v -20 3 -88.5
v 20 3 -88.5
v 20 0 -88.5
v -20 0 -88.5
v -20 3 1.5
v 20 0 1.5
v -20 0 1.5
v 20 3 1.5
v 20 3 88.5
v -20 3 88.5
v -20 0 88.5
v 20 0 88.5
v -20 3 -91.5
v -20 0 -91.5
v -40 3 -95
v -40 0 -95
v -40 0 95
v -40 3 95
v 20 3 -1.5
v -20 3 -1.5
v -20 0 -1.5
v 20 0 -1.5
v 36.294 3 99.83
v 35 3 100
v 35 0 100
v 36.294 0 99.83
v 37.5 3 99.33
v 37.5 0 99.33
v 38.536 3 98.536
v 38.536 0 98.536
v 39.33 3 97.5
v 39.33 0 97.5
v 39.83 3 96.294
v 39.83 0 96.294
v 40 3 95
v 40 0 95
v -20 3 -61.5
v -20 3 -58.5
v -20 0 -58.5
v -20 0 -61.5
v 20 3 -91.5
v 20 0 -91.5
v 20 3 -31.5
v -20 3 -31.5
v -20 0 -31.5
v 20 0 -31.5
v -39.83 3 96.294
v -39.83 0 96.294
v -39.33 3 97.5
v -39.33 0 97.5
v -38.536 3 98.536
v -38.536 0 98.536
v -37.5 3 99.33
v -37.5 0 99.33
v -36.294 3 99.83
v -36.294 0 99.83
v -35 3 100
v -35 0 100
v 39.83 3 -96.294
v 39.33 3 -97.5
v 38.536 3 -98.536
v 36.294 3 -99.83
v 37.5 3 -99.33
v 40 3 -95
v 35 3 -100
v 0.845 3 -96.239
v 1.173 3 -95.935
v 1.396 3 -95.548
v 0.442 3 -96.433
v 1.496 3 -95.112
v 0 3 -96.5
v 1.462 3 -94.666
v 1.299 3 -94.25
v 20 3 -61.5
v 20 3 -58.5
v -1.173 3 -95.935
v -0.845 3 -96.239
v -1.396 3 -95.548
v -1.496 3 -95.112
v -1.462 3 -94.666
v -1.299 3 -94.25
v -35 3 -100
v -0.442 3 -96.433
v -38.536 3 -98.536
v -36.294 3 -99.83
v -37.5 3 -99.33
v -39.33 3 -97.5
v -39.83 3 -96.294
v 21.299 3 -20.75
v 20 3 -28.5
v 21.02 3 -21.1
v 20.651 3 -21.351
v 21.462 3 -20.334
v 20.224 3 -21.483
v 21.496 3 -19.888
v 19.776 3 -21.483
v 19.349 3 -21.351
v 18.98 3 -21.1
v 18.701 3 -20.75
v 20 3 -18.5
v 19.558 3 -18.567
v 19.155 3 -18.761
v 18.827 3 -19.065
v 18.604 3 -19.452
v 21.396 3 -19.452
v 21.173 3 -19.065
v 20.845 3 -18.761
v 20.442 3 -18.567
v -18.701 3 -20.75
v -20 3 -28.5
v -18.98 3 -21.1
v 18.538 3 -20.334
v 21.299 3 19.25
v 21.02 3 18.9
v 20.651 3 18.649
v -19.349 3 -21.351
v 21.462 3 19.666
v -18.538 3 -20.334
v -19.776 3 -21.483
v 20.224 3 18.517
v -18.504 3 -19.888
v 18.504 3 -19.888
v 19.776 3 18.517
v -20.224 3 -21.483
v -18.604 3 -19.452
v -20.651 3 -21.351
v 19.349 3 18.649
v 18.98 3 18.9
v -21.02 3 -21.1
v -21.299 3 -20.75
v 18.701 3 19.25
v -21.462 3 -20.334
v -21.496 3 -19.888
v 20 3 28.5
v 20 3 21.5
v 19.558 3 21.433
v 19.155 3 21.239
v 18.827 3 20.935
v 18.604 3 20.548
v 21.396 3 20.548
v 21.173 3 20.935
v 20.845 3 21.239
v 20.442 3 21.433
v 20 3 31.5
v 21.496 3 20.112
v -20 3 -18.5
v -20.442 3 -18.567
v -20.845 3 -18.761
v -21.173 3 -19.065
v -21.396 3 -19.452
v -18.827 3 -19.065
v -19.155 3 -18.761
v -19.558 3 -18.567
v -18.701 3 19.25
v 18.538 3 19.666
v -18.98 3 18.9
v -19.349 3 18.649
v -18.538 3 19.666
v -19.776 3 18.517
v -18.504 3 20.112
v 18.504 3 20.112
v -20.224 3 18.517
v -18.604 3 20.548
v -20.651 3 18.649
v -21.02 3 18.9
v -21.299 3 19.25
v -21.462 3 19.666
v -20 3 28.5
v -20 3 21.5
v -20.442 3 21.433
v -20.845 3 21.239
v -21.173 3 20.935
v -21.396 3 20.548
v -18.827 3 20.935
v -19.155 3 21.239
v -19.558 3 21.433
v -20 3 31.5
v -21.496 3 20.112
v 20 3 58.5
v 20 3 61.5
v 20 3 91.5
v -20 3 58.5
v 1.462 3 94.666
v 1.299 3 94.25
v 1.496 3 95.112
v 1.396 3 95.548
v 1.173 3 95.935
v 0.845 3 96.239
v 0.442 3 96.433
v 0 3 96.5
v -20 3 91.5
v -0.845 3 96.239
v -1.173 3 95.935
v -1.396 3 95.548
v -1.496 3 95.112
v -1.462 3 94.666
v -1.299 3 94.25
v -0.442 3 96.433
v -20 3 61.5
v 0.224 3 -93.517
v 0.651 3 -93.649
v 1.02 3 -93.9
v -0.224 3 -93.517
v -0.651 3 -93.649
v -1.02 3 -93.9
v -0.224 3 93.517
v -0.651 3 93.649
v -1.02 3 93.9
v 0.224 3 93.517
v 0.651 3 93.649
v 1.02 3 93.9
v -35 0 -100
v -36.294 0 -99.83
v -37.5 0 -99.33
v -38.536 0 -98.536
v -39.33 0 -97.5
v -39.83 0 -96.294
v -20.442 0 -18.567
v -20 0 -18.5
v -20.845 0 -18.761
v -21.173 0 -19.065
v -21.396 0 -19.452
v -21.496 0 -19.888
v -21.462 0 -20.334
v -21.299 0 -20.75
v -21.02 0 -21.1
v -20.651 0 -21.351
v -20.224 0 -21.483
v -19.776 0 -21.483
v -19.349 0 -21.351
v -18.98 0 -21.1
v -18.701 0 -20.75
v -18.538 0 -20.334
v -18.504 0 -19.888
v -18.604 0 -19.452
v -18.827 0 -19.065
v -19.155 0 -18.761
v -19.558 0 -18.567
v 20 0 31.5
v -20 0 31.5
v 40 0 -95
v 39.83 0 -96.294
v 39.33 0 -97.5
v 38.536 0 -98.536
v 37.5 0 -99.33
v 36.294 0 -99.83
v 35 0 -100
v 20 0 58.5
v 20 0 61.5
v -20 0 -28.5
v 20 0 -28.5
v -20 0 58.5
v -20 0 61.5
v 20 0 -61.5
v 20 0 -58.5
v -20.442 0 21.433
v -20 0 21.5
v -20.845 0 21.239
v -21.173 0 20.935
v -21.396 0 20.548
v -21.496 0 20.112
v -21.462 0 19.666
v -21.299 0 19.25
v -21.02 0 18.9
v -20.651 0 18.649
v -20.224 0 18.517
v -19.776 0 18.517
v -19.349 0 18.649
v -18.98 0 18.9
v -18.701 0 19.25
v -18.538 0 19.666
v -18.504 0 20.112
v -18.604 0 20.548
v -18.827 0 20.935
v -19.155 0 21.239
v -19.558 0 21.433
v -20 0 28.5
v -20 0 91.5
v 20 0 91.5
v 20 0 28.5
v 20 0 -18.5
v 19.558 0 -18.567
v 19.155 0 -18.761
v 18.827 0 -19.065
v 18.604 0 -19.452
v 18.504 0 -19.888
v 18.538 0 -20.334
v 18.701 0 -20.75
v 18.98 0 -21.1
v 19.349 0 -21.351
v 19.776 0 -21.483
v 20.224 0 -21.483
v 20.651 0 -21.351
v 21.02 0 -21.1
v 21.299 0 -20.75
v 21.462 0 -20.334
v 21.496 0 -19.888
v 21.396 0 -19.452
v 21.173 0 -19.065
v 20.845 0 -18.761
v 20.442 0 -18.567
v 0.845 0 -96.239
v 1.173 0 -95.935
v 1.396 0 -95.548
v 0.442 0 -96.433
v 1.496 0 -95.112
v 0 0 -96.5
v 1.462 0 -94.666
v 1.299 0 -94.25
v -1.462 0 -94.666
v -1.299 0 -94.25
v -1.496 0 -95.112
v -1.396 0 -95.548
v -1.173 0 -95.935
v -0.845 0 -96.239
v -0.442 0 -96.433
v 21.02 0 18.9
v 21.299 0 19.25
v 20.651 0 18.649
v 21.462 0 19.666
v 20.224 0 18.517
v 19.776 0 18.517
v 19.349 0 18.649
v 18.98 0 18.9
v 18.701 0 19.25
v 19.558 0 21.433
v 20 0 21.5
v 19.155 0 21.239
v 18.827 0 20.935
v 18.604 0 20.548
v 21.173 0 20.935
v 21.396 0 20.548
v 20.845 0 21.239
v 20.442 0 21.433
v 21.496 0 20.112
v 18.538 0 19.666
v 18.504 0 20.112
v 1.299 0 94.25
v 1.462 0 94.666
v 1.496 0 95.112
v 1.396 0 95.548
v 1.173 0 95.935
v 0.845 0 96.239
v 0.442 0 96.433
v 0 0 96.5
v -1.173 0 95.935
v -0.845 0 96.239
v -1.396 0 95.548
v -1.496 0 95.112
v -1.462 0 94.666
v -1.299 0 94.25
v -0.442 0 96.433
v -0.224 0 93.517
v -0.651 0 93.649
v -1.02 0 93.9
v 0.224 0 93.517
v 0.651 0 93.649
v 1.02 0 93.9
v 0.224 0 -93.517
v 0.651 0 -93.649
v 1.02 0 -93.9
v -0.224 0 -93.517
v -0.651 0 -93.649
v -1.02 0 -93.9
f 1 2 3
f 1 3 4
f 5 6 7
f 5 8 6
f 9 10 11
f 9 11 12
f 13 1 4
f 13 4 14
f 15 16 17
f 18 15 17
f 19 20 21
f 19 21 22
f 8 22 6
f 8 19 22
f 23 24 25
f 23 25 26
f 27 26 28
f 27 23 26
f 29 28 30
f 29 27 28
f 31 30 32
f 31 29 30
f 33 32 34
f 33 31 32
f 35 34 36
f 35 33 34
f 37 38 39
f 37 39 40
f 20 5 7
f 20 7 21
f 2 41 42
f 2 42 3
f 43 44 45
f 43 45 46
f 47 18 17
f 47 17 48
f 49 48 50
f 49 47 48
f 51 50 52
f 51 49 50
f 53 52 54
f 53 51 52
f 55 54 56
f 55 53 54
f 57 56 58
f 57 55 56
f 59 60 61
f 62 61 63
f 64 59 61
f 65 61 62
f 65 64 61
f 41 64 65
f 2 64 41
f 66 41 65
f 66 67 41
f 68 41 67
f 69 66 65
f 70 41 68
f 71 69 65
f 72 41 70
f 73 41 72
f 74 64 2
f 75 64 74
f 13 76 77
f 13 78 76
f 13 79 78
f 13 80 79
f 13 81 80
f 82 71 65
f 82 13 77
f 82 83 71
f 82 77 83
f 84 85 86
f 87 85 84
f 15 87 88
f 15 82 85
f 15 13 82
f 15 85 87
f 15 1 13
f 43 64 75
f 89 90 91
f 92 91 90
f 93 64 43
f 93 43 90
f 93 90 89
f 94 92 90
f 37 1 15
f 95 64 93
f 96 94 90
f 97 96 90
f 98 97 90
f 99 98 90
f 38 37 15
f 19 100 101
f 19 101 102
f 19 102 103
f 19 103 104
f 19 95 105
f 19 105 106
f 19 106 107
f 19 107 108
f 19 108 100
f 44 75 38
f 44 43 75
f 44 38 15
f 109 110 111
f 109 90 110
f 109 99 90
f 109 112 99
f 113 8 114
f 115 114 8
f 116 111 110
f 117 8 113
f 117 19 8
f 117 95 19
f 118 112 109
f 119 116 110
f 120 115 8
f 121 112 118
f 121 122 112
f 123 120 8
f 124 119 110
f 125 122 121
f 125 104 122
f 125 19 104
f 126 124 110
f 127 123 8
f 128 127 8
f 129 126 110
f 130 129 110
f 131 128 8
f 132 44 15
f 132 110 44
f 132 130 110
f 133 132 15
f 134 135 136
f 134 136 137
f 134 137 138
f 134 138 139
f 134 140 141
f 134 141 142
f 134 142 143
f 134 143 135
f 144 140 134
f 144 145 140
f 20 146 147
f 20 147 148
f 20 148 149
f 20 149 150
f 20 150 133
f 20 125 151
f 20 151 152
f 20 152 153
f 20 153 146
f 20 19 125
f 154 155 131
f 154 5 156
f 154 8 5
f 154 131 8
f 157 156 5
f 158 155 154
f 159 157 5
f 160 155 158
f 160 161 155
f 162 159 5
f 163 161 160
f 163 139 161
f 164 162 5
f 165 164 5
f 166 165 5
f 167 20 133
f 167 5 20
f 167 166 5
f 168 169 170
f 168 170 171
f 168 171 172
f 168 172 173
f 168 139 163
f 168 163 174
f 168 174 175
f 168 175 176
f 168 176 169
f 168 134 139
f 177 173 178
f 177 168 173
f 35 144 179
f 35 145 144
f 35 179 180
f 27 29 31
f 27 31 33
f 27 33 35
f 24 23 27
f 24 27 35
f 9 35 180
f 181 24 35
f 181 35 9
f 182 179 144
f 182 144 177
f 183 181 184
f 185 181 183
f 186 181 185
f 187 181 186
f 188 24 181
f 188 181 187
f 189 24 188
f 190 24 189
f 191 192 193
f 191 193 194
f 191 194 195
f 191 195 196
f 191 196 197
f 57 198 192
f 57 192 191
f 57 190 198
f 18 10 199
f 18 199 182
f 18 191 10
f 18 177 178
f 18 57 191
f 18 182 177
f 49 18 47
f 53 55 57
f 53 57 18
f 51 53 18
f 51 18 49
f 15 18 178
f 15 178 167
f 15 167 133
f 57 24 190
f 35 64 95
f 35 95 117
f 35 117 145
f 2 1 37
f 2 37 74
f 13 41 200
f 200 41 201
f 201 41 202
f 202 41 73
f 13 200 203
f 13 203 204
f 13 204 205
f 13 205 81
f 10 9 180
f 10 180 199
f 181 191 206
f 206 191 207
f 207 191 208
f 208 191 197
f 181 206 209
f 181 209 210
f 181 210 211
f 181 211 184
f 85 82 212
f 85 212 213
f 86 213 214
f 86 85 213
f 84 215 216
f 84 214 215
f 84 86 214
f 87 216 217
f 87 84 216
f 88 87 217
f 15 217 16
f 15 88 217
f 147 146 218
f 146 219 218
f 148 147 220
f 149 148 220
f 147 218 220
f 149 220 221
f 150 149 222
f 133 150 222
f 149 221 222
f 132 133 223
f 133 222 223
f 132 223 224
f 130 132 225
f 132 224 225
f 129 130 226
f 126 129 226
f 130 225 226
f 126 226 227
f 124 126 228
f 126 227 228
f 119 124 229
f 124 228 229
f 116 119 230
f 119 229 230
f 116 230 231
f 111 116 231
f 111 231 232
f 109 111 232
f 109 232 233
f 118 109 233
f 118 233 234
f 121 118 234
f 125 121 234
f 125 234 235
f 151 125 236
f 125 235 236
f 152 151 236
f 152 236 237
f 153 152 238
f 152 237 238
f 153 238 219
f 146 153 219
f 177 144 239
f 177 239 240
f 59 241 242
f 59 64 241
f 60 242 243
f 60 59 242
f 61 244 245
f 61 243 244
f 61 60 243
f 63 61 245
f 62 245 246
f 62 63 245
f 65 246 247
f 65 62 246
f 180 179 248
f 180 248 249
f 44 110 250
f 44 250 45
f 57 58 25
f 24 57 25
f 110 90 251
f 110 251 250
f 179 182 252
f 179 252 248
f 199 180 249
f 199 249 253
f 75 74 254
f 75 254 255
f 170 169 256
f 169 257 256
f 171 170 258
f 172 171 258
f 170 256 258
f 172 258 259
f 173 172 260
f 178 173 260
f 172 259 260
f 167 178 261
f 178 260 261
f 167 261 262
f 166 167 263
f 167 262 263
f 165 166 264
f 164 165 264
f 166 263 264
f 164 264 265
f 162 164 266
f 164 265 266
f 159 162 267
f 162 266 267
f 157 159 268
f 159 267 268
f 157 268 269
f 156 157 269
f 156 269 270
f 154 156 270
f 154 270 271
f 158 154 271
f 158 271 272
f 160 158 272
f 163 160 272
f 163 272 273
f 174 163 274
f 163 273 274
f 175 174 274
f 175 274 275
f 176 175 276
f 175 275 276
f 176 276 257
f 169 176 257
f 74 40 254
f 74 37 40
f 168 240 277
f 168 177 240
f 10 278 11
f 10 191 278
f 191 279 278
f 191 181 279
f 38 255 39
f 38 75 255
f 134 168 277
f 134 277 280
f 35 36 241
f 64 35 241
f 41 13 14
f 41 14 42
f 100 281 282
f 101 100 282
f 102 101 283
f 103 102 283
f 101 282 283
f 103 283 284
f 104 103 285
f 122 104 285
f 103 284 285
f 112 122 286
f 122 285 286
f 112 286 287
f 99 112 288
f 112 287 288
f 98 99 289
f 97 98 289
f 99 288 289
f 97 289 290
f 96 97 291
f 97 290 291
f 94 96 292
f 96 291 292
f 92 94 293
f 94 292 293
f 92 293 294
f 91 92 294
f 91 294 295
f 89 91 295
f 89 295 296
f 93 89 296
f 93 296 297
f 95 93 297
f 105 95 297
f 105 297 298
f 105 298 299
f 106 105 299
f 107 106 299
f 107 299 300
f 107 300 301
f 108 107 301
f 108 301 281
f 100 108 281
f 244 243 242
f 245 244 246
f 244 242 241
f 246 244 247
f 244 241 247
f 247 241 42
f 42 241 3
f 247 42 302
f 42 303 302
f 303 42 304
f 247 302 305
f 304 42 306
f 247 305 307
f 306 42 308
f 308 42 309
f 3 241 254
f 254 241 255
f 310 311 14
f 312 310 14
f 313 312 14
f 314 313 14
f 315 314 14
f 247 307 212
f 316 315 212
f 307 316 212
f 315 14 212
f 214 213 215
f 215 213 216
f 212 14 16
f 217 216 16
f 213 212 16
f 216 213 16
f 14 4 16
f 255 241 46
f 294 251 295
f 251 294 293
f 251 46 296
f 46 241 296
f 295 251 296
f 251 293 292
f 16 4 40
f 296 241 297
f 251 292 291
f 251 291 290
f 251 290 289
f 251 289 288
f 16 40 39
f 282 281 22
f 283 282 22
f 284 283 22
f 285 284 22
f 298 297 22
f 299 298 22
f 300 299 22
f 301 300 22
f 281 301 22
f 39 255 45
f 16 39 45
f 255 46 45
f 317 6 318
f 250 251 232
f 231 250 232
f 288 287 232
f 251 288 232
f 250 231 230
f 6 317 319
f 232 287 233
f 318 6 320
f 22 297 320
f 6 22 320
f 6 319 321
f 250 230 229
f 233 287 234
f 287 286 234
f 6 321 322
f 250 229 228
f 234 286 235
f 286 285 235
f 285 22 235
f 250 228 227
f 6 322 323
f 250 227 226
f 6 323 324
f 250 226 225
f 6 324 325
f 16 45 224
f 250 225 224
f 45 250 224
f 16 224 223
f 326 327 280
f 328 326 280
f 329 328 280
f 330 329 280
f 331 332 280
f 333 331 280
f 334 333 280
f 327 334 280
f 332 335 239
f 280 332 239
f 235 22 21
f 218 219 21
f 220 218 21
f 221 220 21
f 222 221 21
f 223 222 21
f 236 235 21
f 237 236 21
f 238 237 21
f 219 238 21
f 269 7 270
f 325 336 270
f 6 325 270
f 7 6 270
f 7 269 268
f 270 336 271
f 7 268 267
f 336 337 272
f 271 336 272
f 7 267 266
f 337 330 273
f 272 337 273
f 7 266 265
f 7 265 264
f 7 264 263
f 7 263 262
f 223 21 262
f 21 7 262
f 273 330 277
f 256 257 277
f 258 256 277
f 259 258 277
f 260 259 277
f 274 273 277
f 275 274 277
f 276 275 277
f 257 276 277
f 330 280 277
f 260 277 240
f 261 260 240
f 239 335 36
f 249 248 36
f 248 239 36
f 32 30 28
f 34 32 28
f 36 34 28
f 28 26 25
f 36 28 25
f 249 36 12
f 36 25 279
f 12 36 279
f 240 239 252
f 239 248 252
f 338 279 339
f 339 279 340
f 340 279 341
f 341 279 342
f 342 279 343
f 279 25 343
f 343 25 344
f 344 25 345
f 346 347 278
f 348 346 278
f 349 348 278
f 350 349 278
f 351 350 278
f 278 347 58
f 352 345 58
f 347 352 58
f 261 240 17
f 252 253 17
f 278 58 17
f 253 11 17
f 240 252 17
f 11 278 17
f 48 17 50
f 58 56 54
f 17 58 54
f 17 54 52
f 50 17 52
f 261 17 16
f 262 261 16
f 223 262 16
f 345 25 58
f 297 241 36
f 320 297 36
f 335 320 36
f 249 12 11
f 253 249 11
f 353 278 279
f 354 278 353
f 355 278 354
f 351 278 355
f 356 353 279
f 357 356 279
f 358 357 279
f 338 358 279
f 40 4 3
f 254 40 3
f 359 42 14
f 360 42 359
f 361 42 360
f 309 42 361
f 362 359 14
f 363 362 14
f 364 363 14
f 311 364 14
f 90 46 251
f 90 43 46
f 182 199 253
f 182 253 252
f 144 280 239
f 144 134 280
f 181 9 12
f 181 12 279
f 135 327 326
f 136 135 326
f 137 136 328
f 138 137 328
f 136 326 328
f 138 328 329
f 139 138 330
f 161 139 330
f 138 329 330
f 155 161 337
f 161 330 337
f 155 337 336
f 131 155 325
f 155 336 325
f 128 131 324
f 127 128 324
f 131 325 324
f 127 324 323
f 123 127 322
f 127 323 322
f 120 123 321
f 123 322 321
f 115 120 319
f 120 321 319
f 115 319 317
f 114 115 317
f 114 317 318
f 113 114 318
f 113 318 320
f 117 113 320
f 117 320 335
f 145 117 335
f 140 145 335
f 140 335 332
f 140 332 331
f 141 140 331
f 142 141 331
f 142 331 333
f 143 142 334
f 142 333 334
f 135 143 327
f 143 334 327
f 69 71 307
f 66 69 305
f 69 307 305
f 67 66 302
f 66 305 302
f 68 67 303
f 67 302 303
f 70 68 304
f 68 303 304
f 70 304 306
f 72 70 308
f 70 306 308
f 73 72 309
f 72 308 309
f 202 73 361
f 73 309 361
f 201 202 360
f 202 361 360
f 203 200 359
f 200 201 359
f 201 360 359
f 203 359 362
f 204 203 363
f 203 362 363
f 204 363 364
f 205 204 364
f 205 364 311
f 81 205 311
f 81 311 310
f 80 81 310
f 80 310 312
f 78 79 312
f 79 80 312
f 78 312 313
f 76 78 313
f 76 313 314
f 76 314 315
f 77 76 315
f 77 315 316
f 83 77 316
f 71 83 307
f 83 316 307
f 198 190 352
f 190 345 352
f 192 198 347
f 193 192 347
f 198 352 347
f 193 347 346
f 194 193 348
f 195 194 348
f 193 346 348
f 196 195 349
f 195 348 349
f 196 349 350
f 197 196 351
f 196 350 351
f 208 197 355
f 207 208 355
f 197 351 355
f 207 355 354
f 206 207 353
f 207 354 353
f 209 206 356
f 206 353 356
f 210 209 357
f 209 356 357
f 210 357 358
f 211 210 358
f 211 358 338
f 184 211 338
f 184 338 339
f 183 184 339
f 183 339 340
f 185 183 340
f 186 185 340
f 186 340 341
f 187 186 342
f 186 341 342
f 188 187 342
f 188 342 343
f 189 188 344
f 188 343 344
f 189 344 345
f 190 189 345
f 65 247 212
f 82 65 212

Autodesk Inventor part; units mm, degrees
ref_plane "YZ Plane" through (0, 0, 0) normal (1, 0, 0) x (0, 1, 0)
ref_plane "XZ Plane" through (0, 0, 0) normal (0, 1, 0) x (-1, 0, 0)
ref_plane "XY Plane" through (0, 0, 0) normal (0, 0, 1) x (1, 0, 0)
sketch "Sketch1" plane through (0, 0, 0) normal (0, 1, 0) x (-1, 0, 0)
  line L0 (40, 100) -> (-40, 100)
  line L1 (-40, 100) -> (-40, -100)
  line L2 (-40, -100) -> (40, -100)
  line L3 (40, -100) -> (40, 100)
  line L4 (40, 100) -> (-40, -100) construction
  line L5 (-40, 100) -> (40, -100) construction
  point P0 (0, 0)
  dimension "d0" = 80
  dimension "d1" = 200
extrude "Extrusion1" add sketch "Sketch1" along normal blind 3
sketch "Sketch2" plane through (0, 3, 0) normal (0, 1, 0) x (1, 0, 0)
  line L0 (-20, -20) -> (20, -20) construction
  line L1 (20, -20) -> (20, 20) construction
  line L2 (20, 20) -> (-20, 20) construction
  line L3 (-20, 20) -> (-20, -20) construction
  line L4 (-20, -20) -> (20, 20) construction
  line L5 (20, -20) -> (-20, 20) construction
  point P0 (0, 0)
  dimension "d4" = 40
  dimension "d5" = 40
hole "Hole1" at (-20, 3, 20) at (-20, 3, -20) at (20, 3, -20) at (20, 3, 20) direction (0, -1, 0) diameter 3 end through all
sketch "Sketch3" plane through (0, 3, 0) normal (0, 1, 0) x (1, 0, 0)
  line L0 (20, -1.5) -> (-20, -1.5)
  line L1 (-20, -1.5) -> (-20, 1.5)
  line L2 (-20, 1.5) -> (20, 1.5)
  line L3 (20, 1.5) -> (20, -1.5)
  line L4 (20, -1.5) -> (-20, 1.5) construction
  line L5 (-20, -1.5) -> (20, 1.5) construction
  line L6 (-20, -28.5) -> (20, -28.5)
  line L7 (-20, -31.5) -> (-20, -28.5)
  line L8 (20, -31.5) -> (-20, -31.5)
  line L9 (20, -28.5) -> (20, -31.5)
  line L10 (-20, -58.5) -> (20, -58.5)
  line L11 (-20, -61.5) -> (-20, -58.5)
  line L12 (20, -61.5) -> (-20, -61.5)
  line L13 (20, -58.5) -> (20, -61.5)
  line L14 (-20, -88.5) -> (20, -88.5)
  line L15 (-20, -91.5) -> (-20, -88.5)
  line L16 (20, -91.5) -> (-20, -91.5)
  line L17 (20, -88.5) -> (20, -91.5)
  line L18 (-20, 31.5) -> (20, 31.5)
  line L19 (-20, 28.5) -> (-20, 31.5)
  line L20 (20, 28.5) -> (-20, 28.5)
  line L21 (20, 31.5) -> (20, 28.5)
  line L22 (-20, 1.5) -> (20, 1.5)
  line L23 (-20, -1.5) -> (-20, 1.5)
  line L24 (20, -1.5) -> (-20, -1.5)
  line L25 (20, 1.5) -> (20, -1.5)
  line L26 (-20, -28.5) -> (20, -28.5)
  line L27 (-20, -31.5) -> (-20, -28.5)
  line L28 (20, -31.5) -> (-20, -31.5)
  line L29 (20, -28.5) -> (20, -31.5)
  line L30 (-20, -58.5) -> (20, -58.5)
  line L31 (-20, -61.5) -> (-20, -58.5)
  line L32 (20, -61.5) -> (-20, -61.5)
  line L33 (20, -58.5) -> (20, -61.5)
  line L34 (-20, 61.5) -> (20, 61.5)
  line L35 (-20, 58.5) -> (-20, 61.5)
  line L36 (20, 58.5) -> (-20, 58.5)
  line L37 (20, 61.5) -> (20, 58.5)
  line L38 (-20, 31.5) -> (20, 31.5)
  line L39 (-20, 28.5) -> (-20, 31.5)
  line L40 (20, 28.5) -> (-20, 28.5)
  line L41 (20, 31.5) -> (20, 28.5)
  line L42 (-20, 1.5) -> (20, 1.5)
  line L43 (-20, -1.5) -> (-20, 1.5)
  line L44 (20, -1.5) -> (-20, -1.5)
  line L45 (20, 1.5) -> (20, -1.5)
  line L46 (-20, -28.5) -> (20, -28.5)
  line L47 (-20, -31.5) -> (-20, -28.5)
  line L48 (20, -31.5) -> (-20, -31.5)
  line L49 (20, -28.5) -> (20, -31.5)
  line L50 (-20, 91.5) -> (20, 91.5)
  line L51 (-20, 88.5) -> (-20, 91.5)
  line L52 (20, 88.5) -> (-20, 88.5)
  line L53 (20, 91.5) -> (20, 88.5)
  line L54 (-20, 61.5) -> (20, 61.5)
  line L55 (-20, 58.5) -> (-20, 61.5)
  line L56 (20, 58.5) -> (-20, 58.5)
  line L57 (20, 61.5) -> (20, 58.5)
  line L58 (-20, 31.5) -> (20, 31.5)
  line L59 (-20, 28.5) -> (-20, 31.5)
  line L60 (20, 28.5) -> (-20, 28.5)
  line L61 (20, 31.5) -> (20, 28.5)
  line L62 (-20, 1.5) -> (20, 1.5)
  line L63 (-20, -1.5) -> (-20, 1.5)
  line L64 (20, -1.5) -> (-20, -1.5)
  line L65 (20, 1.5) -> (20, -1.5)
  point P0 (0, 0)
  dimension "d13" = 40
  dimension "d14" = 3
  dimension "d17" = 30
  dimension "d20" = 30
extrude "Extrusion2" cut sketch "Sketch3" against normal blind 3
sketch "Sketch4" plane through (0, 3, 0) normal (0, 1, 0) x (1, 0, 0)
  line L0 (-40, -100) -> (40, -100) construction
  line L1 (0, -100) -> (0, -95) construction
  point P0 (0, 0)
  dimension "d25" = 5
hole "Hole2" at (0, 3, 95) direction (0, -1, 0) diameter 3 end through all
ref_plane "Work Plane1" through (-40, 0, 0) normal (0, 0, 1) x (1, 0, 0)
mirror "Mirror1" about plane through (-40, 0, 0) normal (0, 0, 1) of "Hole2"
fillet "Fillet1" radius 5 4 edges at (40, 1.5, 100) (-40, 1.5, 100) (40, 1.5, -100) (-40, 1.5, -100)
properties part number "mounting_plate"
